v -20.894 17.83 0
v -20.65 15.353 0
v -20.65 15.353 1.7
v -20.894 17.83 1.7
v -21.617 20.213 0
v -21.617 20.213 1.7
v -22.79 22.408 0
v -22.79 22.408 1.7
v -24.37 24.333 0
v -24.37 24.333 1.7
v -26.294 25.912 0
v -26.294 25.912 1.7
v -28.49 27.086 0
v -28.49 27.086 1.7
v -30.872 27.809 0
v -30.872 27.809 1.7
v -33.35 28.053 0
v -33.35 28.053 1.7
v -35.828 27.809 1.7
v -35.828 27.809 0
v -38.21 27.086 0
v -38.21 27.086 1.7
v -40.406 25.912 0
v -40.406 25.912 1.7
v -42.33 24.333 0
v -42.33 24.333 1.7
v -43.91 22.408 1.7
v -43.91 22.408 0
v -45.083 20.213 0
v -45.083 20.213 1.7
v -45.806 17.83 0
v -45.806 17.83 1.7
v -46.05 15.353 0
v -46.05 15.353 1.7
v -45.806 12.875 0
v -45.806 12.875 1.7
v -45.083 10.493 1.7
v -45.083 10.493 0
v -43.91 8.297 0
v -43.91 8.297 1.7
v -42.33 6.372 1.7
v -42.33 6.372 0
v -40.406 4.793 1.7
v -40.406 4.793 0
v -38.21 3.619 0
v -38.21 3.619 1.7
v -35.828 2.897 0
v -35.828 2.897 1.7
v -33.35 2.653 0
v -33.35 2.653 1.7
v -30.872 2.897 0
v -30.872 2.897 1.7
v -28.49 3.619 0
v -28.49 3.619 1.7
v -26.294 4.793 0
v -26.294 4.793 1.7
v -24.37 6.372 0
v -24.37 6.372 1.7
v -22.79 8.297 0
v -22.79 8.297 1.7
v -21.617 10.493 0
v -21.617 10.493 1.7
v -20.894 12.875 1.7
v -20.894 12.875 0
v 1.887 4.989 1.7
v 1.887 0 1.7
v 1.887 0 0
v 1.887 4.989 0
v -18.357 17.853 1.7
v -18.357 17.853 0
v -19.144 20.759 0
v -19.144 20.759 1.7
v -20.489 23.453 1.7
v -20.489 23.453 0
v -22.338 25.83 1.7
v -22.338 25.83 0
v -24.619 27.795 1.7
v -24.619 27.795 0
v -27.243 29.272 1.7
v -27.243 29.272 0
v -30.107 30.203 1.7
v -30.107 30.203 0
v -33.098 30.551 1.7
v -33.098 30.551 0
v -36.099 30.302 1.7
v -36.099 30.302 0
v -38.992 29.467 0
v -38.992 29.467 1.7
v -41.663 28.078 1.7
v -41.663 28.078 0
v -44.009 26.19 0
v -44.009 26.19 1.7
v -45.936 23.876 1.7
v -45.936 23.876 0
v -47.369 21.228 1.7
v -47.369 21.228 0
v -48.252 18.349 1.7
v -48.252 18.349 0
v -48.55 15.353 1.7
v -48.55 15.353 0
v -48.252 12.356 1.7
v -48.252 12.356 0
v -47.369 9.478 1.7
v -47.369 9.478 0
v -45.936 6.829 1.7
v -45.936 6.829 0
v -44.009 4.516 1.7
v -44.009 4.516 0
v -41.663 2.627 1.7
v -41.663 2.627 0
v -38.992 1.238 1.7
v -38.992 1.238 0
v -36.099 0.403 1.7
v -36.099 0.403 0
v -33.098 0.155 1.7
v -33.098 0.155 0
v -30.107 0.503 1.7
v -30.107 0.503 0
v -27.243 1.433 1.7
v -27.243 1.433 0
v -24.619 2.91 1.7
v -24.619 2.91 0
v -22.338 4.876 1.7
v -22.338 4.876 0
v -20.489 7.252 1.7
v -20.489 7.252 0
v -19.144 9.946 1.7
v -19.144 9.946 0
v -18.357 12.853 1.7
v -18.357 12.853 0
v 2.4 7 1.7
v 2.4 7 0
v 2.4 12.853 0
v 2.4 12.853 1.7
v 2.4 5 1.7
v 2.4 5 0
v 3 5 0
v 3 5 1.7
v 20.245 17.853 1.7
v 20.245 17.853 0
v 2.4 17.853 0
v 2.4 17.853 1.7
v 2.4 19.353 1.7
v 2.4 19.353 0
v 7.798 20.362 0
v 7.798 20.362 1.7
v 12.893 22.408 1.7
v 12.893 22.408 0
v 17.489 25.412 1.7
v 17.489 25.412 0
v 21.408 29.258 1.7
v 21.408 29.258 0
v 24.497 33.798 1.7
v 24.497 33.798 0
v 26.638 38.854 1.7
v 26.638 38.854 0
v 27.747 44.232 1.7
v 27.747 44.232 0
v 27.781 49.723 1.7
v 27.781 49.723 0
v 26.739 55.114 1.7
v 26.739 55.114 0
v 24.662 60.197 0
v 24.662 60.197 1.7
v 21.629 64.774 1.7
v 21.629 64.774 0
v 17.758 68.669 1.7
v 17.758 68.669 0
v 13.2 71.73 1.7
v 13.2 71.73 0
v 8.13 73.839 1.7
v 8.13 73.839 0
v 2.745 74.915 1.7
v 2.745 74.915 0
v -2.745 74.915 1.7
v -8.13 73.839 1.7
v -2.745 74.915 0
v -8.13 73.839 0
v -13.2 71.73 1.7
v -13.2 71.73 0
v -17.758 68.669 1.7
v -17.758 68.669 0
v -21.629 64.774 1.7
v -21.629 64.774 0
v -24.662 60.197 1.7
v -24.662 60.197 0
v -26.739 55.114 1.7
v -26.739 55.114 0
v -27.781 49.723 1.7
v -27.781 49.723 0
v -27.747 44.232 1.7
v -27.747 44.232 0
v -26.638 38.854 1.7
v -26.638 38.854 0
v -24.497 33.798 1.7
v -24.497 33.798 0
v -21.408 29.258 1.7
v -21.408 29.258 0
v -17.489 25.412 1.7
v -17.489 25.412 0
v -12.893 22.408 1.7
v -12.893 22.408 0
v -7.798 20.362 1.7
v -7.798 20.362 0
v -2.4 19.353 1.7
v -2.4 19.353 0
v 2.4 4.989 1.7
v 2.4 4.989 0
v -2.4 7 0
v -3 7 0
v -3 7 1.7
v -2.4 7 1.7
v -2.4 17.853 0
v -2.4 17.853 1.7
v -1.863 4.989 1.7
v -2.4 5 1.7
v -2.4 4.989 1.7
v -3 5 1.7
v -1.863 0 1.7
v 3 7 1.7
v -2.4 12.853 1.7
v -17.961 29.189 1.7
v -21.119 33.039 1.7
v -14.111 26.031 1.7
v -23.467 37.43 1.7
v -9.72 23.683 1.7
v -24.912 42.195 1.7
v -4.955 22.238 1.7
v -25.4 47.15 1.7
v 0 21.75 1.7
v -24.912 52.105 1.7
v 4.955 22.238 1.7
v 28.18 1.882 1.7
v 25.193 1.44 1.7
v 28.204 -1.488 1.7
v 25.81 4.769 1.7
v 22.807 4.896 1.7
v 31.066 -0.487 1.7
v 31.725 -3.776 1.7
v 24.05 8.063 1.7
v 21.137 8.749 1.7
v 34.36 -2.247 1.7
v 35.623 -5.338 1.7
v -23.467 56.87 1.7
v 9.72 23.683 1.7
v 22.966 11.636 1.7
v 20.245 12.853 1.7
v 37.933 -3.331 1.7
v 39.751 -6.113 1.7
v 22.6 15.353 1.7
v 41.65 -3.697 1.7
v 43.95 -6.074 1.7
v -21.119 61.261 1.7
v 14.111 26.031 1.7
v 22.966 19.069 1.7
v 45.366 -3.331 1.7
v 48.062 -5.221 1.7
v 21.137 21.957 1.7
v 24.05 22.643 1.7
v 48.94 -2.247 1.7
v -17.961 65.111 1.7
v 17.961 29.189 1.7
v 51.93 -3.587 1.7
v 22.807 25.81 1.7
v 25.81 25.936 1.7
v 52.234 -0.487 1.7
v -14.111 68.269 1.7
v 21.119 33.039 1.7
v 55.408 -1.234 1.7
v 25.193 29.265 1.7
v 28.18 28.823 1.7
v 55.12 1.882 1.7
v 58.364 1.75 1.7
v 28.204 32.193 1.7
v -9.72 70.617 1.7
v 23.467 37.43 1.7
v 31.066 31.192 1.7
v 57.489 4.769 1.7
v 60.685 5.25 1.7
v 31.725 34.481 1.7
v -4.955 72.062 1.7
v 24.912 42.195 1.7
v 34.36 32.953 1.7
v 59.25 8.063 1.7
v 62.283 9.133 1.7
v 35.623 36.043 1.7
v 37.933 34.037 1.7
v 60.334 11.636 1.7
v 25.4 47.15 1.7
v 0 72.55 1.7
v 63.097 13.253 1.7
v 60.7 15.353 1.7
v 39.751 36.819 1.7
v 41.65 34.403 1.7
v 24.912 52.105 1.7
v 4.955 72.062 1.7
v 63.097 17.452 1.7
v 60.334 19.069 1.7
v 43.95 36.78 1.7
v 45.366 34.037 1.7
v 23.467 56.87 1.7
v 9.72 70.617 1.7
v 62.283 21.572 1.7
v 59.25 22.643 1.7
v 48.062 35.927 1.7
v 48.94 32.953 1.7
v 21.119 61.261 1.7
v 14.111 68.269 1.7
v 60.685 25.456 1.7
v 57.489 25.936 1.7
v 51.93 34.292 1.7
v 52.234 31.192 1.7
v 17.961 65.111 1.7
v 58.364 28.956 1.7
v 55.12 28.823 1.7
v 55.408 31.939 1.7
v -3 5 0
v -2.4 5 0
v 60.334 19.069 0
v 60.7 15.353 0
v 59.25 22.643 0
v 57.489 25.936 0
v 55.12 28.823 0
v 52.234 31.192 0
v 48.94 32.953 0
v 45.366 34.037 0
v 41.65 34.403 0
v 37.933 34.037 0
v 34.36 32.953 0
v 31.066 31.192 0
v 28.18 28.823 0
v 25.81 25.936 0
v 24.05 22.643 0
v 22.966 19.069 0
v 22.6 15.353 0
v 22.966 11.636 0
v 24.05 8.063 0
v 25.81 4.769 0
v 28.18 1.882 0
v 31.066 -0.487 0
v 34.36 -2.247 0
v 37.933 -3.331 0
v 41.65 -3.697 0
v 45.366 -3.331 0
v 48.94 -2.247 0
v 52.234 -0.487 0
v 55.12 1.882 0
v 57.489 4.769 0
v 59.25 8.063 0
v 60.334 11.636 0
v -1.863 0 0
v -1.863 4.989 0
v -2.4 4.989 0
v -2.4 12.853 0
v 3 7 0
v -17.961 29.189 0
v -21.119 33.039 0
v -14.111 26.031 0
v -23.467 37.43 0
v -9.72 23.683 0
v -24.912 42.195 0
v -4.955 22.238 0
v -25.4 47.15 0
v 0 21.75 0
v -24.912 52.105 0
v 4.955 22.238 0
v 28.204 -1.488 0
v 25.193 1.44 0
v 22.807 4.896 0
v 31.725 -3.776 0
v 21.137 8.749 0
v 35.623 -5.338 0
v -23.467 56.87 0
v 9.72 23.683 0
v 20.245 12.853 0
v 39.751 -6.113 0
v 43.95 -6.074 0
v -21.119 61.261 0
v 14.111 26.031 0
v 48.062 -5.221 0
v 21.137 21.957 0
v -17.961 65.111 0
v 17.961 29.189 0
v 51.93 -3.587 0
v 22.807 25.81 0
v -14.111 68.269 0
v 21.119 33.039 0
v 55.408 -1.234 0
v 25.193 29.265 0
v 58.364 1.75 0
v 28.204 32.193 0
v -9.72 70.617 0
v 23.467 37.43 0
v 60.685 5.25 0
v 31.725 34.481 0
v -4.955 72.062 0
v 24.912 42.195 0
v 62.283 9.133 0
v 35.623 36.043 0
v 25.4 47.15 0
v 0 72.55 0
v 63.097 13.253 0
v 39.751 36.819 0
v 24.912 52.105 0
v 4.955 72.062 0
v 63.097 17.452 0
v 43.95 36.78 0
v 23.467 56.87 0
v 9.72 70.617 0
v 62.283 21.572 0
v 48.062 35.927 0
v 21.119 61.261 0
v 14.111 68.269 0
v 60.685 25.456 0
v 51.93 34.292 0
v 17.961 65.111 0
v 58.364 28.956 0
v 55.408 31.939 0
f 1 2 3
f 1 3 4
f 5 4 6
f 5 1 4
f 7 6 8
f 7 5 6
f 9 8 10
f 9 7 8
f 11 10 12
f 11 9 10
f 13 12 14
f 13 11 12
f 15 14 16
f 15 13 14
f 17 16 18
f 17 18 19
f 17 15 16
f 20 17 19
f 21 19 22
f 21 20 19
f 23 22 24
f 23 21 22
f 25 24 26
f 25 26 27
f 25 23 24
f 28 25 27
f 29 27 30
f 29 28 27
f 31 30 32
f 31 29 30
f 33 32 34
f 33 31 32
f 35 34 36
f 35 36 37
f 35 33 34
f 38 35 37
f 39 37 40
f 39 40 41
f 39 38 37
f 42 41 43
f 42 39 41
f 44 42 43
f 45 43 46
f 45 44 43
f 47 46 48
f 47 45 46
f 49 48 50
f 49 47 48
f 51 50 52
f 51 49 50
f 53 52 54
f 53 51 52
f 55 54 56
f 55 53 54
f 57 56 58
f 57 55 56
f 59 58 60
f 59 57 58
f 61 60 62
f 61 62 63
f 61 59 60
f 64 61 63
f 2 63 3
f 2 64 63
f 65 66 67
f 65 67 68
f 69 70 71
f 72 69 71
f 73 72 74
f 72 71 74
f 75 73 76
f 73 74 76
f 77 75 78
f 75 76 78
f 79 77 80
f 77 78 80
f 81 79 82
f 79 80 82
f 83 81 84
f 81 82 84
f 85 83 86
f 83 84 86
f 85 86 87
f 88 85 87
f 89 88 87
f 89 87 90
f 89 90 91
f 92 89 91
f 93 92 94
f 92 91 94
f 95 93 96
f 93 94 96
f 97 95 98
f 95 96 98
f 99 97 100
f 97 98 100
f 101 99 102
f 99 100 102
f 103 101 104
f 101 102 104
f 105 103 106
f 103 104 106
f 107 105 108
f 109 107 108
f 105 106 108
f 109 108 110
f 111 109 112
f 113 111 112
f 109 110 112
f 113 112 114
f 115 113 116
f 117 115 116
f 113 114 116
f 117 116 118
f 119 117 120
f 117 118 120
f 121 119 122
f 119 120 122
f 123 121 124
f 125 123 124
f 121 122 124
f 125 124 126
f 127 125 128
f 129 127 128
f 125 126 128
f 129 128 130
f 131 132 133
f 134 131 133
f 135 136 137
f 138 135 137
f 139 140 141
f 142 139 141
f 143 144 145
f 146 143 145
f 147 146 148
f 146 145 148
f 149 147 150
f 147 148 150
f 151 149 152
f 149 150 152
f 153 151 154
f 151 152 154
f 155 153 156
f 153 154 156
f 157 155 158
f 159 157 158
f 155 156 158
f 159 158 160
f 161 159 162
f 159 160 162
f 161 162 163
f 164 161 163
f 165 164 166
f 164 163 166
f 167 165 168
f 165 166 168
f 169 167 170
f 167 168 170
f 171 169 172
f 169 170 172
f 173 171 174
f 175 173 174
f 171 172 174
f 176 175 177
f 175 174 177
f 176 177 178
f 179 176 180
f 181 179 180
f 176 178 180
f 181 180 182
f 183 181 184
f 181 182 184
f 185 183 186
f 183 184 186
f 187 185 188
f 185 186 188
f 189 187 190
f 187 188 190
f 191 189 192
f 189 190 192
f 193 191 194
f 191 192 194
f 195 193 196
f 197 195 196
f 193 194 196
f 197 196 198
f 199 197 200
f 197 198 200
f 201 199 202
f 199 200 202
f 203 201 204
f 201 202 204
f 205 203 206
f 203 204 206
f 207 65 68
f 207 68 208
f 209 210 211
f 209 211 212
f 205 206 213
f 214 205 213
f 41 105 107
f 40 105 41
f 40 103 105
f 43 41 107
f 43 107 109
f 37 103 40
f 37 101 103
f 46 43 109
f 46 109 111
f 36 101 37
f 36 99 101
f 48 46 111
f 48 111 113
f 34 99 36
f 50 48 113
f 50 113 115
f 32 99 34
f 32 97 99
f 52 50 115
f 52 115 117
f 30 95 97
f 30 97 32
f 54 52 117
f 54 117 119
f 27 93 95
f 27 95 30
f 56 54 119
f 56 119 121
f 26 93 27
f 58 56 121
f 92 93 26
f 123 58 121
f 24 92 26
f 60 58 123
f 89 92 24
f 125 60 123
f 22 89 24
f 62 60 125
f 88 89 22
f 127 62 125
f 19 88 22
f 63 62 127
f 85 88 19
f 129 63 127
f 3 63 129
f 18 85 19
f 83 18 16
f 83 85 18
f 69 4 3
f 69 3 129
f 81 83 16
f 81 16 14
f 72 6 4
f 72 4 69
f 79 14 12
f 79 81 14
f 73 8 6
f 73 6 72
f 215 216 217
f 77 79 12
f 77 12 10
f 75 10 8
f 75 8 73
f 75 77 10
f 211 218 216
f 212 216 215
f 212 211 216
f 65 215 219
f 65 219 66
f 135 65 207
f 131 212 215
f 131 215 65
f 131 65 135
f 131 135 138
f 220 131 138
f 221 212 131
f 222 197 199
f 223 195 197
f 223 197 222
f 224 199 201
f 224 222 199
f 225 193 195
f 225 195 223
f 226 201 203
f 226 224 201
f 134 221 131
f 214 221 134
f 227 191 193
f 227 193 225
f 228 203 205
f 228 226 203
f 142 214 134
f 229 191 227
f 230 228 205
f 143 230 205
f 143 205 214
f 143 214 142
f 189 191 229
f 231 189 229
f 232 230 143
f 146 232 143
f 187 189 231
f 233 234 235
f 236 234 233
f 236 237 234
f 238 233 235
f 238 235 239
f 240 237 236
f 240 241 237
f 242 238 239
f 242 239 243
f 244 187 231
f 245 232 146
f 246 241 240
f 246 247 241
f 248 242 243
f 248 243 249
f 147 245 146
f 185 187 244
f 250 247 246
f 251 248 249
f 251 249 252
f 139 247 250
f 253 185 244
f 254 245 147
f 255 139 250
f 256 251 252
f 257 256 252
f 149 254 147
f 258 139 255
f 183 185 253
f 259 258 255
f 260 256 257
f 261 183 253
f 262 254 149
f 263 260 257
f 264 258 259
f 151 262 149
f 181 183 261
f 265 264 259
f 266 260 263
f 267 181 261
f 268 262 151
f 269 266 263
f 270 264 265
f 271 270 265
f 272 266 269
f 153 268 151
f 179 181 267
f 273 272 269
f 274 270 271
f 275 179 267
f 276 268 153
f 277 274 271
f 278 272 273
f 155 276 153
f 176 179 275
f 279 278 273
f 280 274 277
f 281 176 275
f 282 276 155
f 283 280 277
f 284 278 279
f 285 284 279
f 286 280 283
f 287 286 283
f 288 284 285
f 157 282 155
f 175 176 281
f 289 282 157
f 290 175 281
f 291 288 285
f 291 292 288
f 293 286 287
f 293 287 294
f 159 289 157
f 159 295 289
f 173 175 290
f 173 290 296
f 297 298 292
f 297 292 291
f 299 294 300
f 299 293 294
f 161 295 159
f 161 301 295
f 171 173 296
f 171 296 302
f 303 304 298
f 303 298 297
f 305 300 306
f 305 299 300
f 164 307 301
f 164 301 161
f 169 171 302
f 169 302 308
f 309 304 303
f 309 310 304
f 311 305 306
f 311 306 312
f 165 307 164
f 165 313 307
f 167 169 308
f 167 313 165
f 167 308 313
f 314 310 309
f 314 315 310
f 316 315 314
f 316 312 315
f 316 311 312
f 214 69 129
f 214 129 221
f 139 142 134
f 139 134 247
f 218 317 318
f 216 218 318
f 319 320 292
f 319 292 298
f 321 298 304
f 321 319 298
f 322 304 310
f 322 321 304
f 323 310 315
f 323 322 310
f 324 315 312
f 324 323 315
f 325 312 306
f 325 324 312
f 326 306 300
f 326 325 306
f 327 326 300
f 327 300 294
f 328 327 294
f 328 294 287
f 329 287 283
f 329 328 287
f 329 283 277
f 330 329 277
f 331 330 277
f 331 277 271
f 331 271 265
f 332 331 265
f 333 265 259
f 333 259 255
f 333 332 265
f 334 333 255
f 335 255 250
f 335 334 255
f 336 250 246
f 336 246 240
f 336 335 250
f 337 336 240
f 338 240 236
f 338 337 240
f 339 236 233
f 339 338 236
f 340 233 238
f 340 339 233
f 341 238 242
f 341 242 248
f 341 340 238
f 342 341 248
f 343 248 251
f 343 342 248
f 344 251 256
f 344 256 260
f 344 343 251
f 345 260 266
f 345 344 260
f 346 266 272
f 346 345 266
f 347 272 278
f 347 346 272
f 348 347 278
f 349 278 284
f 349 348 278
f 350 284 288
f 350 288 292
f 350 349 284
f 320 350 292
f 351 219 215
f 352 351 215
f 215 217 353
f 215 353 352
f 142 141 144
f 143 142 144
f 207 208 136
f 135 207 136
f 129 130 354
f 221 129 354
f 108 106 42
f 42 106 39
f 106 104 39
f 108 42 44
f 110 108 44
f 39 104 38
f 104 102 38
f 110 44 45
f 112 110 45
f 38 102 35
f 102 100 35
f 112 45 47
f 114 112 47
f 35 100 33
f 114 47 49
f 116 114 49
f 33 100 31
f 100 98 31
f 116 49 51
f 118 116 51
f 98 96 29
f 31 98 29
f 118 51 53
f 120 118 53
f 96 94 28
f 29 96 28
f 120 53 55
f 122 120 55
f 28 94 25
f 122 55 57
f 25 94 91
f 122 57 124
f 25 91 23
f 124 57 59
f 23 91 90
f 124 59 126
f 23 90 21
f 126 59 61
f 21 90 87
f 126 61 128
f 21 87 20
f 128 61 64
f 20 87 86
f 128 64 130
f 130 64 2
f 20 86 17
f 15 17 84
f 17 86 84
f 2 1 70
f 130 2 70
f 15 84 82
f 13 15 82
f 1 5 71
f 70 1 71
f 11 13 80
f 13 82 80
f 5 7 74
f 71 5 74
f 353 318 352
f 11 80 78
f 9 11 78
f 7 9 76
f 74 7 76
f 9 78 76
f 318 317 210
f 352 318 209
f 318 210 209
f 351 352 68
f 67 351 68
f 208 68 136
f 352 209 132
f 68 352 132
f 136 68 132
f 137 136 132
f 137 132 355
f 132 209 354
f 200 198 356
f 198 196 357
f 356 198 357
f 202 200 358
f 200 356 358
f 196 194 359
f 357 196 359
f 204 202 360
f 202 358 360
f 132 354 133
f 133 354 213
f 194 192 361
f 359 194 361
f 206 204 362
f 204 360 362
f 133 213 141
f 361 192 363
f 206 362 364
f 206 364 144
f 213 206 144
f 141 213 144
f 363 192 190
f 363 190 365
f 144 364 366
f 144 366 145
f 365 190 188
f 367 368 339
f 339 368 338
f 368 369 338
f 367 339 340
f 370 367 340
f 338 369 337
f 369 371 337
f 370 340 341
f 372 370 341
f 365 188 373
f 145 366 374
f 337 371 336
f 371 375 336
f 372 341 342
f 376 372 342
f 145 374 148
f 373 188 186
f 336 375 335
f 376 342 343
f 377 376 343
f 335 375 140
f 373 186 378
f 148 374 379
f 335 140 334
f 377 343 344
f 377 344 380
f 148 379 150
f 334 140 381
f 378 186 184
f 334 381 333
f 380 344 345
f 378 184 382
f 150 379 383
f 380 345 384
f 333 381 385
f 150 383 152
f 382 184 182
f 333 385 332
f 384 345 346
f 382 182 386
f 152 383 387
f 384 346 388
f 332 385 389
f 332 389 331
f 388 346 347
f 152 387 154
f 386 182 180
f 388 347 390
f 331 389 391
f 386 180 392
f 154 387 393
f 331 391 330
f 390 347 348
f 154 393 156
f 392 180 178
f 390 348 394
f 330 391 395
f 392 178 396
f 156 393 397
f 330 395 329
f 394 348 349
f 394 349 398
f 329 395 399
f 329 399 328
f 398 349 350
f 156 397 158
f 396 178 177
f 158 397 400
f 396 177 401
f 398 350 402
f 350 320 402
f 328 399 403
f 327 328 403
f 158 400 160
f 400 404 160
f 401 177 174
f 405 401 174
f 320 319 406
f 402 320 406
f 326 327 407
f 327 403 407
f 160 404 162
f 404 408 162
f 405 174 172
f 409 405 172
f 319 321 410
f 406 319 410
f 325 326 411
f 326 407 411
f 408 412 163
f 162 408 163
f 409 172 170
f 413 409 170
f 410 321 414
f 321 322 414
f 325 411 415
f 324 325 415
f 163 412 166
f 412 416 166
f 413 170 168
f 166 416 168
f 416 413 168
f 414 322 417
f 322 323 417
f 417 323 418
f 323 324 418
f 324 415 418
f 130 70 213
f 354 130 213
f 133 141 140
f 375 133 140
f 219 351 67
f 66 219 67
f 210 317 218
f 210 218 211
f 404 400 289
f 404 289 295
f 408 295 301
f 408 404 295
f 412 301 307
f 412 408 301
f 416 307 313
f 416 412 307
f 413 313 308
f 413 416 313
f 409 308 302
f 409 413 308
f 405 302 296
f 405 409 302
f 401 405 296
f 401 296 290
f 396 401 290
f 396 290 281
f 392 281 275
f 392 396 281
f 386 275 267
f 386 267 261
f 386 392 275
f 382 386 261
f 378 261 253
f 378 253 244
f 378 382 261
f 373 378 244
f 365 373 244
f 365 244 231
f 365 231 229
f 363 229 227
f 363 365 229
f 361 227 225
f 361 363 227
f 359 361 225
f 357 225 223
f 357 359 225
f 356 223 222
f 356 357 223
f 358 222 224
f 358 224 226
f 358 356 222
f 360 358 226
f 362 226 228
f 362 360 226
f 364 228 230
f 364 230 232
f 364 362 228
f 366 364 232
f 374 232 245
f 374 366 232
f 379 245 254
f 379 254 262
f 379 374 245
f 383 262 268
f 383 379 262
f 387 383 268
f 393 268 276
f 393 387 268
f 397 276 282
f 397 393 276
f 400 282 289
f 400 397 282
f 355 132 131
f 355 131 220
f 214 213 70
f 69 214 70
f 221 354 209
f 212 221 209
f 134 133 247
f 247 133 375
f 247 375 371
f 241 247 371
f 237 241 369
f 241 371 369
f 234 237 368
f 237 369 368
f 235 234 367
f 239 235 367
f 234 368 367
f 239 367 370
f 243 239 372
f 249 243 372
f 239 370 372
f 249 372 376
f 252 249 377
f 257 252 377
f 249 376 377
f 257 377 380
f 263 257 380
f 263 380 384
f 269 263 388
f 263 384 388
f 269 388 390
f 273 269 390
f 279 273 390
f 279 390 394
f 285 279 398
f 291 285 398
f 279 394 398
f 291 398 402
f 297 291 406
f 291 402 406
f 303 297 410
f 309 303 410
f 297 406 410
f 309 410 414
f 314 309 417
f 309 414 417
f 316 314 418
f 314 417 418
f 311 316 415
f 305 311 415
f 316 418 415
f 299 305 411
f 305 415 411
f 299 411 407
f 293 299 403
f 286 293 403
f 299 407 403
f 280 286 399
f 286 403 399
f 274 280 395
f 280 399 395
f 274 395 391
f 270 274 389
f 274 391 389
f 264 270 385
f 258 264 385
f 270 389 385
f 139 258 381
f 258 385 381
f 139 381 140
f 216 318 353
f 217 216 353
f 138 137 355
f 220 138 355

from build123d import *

# Parameters (mm, degrees)
SKETCH_R      = 25.4
SKETCH_R_2    = 19.05
SKETCH_R_3    = 12.7
SKETCH_W      = 6
SKETCH_H      = 2
PAD_DEPTH     = 1.7
SKETCH001_W   = 1.720414
SKETCH001_H   = 4.989207
SKETCH001_W_2 = 2.270946
POCKET_DEPTH  = 5


with BuildPart() as part:
    # Sketch → Pad (new body)
    with BuildSketch(Plane.XY):
        with BuildLine():
            Line((-2.4, 19.353417), (-2.4, 17.852674))
            Line((-2.4, 17.852674), (-18.357101, 17.852674))
            ThreePointArc((-18.357101, 17.852674), (-48.5501, 15.352674), (-18.357101, 12.852674))
            Line((-18.357101, 12.852674), (-2.4, 12.852674))
            Line((-2.4, 12.852674), (-2.4, 0))
            Line((-2.4, 0), (2.4, 0))
            Line((2.4, 0), (2.4, 12.852674))
            Line((2.4, 12.852674), (20.245403, 12.852674))
            ThreePointArc((20.245403, 12.852674), (63.1999, 15.352674), (20.245403, 17.852674))
            Line((20.245403, 17.852674), (2.4, 17.852674))
            Line((2.4, 17.852674), (2.4, 19.353417))
            ThreePointArc((2.4, 19.353417), (0, 75.05), (-2.4, 19.353417))
        make_face()
        with Locations((0, 47.15)):
            Circle(SKETCH_R, mode=Mode.SUBTRACT)
        with Locations((41.6499, 15.352674)):
            Circle(SKETCH_R_2, mode=Mode.SUBTRACT)
        with Locations((-33.3501, 15.352674)):
            Circle(SKETCH_R_3, mode=Mode.SUBTRACT)
        with Locations((0, 6)):
            Rectangle(SKETCH_W, SKETCH_H)
    extrude(amount=PAD_DEPTH)

    # Sketch001 (on Face25 of Pad) → Pocket (cut)
    with BuildSketch(Plane.XY.offset(1.7)):
        with Locations((-2.723439, 2.494603)):
            Rectangle(SKETCH001_W, SKETCH001_H)
        with Locations((3.02274, 2.494603)):
            Rectangle(SKETCH001_W_2, SKETCH001_H)
    extrude(amount=-POCKET_DEPTH, mode=Mode.SUBTRACT)


solid = part.part
